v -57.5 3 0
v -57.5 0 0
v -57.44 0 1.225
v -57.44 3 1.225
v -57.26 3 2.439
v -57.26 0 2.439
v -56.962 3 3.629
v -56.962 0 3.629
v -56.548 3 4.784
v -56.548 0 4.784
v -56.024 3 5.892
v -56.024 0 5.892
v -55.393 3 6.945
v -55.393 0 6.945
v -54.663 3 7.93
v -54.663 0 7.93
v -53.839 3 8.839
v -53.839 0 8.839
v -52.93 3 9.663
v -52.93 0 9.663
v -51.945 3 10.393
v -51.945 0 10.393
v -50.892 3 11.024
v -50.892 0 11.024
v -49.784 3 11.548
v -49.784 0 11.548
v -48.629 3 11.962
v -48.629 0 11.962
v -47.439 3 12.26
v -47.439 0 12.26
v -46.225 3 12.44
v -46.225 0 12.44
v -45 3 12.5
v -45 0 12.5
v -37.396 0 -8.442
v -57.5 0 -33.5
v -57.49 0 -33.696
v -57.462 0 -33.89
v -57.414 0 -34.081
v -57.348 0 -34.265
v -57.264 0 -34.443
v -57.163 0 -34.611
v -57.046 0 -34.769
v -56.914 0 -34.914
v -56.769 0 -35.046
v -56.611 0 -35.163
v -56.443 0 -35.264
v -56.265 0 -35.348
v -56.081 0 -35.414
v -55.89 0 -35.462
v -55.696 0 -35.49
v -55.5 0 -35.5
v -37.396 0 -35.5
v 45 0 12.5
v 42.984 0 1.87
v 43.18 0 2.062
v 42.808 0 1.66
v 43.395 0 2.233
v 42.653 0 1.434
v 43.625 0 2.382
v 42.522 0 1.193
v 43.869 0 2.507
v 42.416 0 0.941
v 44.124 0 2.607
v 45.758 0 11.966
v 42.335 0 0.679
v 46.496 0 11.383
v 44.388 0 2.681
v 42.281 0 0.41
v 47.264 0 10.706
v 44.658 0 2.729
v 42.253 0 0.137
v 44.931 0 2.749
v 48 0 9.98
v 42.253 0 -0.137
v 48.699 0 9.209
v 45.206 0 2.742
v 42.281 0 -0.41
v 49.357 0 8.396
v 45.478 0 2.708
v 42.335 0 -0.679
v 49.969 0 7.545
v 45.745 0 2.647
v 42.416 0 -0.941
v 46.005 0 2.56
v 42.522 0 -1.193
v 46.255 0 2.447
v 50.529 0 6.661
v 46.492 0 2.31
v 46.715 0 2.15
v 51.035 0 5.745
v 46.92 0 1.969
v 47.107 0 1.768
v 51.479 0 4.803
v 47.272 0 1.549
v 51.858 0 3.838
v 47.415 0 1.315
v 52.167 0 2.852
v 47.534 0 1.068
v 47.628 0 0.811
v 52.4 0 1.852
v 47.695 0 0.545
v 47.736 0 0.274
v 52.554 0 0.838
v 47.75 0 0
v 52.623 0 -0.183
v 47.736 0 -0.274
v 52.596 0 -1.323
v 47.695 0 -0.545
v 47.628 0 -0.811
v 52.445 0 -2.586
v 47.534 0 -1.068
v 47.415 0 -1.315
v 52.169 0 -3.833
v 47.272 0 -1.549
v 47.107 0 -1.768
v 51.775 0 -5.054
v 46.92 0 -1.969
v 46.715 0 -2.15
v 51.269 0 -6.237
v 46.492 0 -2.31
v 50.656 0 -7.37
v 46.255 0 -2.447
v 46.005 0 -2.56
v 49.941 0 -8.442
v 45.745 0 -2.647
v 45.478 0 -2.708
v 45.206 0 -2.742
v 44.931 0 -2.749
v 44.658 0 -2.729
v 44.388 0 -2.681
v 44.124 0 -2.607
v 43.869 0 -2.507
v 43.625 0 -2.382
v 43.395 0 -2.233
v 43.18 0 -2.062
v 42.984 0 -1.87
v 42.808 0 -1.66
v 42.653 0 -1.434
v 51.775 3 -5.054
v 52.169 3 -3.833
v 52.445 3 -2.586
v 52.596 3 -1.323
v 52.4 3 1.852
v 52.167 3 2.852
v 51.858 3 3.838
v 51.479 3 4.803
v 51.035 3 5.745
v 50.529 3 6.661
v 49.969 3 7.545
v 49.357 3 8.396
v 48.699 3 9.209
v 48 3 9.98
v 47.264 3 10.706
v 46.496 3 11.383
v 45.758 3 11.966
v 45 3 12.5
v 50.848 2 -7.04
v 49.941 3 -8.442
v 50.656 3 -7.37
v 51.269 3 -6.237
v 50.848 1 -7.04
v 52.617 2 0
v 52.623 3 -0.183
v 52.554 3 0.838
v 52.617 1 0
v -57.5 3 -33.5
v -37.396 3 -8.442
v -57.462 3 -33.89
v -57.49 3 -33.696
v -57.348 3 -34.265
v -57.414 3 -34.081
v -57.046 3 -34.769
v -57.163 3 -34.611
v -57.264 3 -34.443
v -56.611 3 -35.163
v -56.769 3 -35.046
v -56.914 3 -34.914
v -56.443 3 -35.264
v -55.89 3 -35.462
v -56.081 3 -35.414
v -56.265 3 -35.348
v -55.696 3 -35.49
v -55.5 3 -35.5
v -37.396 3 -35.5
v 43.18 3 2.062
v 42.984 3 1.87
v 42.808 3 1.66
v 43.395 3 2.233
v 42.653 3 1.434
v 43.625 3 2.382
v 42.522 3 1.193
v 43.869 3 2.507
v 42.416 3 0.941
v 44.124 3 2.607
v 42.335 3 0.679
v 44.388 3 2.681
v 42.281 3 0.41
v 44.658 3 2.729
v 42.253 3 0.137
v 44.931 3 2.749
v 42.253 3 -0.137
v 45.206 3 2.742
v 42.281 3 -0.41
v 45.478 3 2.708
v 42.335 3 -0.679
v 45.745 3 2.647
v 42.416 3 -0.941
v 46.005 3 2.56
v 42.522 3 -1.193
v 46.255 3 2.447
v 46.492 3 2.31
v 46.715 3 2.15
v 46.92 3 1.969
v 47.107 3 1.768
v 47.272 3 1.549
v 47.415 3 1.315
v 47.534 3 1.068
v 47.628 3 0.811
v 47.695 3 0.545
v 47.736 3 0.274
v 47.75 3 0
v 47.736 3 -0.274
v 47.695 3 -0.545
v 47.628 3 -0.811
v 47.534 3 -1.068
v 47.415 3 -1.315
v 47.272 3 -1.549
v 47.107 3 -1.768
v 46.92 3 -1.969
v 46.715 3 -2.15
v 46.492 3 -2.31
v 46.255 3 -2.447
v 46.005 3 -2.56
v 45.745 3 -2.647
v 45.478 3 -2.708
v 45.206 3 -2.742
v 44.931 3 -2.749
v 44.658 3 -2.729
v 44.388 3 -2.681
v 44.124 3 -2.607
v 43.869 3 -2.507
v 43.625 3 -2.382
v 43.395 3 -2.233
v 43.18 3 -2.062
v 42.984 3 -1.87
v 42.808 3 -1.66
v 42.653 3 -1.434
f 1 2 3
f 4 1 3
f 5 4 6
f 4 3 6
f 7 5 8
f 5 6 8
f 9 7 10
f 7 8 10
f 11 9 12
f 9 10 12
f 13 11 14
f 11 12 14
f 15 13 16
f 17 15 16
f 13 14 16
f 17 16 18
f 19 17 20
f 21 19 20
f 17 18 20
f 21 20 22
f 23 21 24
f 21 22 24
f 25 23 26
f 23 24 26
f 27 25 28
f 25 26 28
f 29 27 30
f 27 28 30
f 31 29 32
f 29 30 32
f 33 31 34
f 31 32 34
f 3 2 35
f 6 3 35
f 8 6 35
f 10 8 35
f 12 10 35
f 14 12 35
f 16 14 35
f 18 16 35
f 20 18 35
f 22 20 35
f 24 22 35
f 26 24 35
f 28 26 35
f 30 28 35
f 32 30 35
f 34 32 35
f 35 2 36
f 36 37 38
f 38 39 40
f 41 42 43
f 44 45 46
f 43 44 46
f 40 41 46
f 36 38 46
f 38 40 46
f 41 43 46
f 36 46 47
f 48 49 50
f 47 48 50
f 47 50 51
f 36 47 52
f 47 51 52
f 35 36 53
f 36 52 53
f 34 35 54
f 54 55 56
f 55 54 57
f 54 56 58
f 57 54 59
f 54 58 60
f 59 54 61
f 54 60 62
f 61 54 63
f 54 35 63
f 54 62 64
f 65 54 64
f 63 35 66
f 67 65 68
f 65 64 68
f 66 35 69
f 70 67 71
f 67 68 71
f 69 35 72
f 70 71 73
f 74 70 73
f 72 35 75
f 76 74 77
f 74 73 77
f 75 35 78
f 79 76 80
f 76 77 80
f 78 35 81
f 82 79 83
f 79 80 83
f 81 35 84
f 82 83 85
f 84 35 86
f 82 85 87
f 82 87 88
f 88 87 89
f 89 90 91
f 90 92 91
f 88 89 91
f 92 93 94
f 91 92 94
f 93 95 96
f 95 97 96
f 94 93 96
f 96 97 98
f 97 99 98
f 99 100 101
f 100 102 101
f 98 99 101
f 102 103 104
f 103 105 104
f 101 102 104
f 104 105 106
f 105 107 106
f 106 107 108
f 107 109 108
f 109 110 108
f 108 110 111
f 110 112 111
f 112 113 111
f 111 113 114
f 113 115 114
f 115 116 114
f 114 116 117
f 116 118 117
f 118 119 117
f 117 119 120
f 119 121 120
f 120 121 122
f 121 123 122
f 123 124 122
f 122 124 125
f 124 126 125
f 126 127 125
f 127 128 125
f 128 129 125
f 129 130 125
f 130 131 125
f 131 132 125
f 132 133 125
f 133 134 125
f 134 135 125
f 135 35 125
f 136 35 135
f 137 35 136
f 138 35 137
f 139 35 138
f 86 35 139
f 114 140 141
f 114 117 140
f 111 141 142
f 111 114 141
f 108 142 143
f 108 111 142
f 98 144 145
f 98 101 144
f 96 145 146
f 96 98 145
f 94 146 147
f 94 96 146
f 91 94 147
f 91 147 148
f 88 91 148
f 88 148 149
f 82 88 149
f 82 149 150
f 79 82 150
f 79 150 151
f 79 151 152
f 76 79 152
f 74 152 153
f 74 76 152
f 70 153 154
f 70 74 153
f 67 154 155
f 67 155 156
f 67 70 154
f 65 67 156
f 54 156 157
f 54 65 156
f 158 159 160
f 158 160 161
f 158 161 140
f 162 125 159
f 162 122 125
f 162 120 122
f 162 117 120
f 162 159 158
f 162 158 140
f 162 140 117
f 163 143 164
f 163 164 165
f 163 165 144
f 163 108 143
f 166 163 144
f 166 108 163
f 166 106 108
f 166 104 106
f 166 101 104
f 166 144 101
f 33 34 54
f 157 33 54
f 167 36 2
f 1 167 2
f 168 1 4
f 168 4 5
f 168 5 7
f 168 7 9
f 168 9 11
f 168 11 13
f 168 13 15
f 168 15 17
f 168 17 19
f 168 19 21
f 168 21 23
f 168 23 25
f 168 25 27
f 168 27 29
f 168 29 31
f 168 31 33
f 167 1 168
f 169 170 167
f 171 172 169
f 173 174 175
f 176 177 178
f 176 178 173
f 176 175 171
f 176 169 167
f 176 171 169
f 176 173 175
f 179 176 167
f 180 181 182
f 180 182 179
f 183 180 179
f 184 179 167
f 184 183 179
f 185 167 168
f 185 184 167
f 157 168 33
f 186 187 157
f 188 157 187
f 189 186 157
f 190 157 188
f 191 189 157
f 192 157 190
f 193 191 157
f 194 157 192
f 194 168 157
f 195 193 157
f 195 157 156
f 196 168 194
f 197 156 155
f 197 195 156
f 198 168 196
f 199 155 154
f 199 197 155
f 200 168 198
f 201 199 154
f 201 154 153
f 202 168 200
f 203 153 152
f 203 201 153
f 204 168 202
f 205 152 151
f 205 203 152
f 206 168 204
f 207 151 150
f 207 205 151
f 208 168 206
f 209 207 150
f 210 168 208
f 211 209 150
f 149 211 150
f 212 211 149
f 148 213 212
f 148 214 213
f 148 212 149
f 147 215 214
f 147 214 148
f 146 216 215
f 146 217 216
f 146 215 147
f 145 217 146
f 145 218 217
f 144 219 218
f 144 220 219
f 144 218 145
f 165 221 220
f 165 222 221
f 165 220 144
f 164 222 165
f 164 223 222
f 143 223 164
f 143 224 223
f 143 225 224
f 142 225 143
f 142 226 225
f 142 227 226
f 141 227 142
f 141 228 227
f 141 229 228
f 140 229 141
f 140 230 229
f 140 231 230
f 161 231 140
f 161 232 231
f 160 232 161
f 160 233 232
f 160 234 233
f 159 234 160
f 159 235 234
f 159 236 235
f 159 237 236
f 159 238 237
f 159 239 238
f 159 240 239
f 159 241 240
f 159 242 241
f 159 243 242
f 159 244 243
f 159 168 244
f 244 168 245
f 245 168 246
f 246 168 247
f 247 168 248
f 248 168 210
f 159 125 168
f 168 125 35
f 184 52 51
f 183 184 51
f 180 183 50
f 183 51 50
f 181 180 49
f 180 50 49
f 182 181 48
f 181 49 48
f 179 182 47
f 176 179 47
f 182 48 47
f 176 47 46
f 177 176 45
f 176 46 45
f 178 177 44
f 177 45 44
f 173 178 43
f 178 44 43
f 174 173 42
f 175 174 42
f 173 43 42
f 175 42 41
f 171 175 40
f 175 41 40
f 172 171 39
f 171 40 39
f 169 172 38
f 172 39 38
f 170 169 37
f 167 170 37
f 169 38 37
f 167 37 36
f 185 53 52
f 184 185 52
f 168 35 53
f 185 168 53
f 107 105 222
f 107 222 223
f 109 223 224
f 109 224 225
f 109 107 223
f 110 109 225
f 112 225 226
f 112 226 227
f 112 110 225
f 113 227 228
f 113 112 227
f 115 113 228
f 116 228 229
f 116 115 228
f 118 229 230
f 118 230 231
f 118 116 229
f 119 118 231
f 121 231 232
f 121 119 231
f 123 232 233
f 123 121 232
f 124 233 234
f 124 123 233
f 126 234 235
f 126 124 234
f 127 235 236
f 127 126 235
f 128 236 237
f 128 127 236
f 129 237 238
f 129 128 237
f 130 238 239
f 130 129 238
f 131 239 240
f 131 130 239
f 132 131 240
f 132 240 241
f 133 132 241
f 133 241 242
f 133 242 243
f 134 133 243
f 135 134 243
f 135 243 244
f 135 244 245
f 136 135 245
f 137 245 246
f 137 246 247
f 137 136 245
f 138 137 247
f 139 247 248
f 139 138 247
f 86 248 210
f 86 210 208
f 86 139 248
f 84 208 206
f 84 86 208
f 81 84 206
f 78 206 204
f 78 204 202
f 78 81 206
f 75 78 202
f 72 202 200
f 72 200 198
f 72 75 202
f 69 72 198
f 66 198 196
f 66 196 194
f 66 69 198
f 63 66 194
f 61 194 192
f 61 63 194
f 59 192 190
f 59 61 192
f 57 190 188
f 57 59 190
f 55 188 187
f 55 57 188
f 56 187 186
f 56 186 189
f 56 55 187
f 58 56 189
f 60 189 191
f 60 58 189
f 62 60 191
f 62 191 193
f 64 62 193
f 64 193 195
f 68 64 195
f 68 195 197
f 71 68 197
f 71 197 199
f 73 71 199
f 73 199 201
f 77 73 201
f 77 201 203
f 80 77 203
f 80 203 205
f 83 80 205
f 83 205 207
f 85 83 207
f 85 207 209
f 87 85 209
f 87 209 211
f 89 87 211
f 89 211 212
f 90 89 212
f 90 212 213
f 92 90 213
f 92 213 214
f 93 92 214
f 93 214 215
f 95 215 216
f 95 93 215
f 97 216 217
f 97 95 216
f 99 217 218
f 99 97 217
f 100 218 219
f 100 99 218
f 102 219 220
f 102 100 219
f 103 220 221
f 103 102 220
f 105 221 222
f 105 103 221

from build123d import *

# Parameters (mm, degrees)
SKETCH1_R           = 2.75
BOSS_EXTRUDE6_DEPTH = 3


with BuildPart() as part:
    # Sketch1 → Boss-Extrude6 (new body)
    with BuildSketch(Plane(origin=(0, 0, 0), x_dir=(1, 0, 0), z_dir=(0, 1, 0))):
        with BuildLine():
            Line((-45, -12.5), (45, -12.5))
            add(Edge.make_bspline(
                [(49.941104818, 8.442089367), (50.270924983, 7.993844293), (51.917772, 5.447061543), (54.055554594, -2.684937186), (49.028319605, -9.822821411), (45, -12.5)],
                knots=[0.210171728, 0.210171728, 0.210171728, 0.210171728, 0.264235121, 0.503984815, 1, 1, 1, 1], degree=3))
            Line((49.941104818, 8.442089367), (-37.395508702, 8.442089367))
            Line((-37.395508702, 8.442089367), (-37.395508702, 35.5))
            Line((-37.395508702, 35.5), (-55.5, 35.5))
            ThreePointArc((-55.5, 35.5), (-56.914213562, 34.914213562), (-57.5, 33.5))
            Line((-57.5, 33.5), (-57.5, 0))
            ThreePointArc((-57.5, 0), (-53.838834765, -8.838834765), (-45, -12.5))
        make_face()
        with Locations((45, 0)):
            Circle(SKETCH1_R, mode=Mode.SUBTRACT)
    extrude(amount=BOSS_EXTRUDE6_DEPTH)


solid = part.part
